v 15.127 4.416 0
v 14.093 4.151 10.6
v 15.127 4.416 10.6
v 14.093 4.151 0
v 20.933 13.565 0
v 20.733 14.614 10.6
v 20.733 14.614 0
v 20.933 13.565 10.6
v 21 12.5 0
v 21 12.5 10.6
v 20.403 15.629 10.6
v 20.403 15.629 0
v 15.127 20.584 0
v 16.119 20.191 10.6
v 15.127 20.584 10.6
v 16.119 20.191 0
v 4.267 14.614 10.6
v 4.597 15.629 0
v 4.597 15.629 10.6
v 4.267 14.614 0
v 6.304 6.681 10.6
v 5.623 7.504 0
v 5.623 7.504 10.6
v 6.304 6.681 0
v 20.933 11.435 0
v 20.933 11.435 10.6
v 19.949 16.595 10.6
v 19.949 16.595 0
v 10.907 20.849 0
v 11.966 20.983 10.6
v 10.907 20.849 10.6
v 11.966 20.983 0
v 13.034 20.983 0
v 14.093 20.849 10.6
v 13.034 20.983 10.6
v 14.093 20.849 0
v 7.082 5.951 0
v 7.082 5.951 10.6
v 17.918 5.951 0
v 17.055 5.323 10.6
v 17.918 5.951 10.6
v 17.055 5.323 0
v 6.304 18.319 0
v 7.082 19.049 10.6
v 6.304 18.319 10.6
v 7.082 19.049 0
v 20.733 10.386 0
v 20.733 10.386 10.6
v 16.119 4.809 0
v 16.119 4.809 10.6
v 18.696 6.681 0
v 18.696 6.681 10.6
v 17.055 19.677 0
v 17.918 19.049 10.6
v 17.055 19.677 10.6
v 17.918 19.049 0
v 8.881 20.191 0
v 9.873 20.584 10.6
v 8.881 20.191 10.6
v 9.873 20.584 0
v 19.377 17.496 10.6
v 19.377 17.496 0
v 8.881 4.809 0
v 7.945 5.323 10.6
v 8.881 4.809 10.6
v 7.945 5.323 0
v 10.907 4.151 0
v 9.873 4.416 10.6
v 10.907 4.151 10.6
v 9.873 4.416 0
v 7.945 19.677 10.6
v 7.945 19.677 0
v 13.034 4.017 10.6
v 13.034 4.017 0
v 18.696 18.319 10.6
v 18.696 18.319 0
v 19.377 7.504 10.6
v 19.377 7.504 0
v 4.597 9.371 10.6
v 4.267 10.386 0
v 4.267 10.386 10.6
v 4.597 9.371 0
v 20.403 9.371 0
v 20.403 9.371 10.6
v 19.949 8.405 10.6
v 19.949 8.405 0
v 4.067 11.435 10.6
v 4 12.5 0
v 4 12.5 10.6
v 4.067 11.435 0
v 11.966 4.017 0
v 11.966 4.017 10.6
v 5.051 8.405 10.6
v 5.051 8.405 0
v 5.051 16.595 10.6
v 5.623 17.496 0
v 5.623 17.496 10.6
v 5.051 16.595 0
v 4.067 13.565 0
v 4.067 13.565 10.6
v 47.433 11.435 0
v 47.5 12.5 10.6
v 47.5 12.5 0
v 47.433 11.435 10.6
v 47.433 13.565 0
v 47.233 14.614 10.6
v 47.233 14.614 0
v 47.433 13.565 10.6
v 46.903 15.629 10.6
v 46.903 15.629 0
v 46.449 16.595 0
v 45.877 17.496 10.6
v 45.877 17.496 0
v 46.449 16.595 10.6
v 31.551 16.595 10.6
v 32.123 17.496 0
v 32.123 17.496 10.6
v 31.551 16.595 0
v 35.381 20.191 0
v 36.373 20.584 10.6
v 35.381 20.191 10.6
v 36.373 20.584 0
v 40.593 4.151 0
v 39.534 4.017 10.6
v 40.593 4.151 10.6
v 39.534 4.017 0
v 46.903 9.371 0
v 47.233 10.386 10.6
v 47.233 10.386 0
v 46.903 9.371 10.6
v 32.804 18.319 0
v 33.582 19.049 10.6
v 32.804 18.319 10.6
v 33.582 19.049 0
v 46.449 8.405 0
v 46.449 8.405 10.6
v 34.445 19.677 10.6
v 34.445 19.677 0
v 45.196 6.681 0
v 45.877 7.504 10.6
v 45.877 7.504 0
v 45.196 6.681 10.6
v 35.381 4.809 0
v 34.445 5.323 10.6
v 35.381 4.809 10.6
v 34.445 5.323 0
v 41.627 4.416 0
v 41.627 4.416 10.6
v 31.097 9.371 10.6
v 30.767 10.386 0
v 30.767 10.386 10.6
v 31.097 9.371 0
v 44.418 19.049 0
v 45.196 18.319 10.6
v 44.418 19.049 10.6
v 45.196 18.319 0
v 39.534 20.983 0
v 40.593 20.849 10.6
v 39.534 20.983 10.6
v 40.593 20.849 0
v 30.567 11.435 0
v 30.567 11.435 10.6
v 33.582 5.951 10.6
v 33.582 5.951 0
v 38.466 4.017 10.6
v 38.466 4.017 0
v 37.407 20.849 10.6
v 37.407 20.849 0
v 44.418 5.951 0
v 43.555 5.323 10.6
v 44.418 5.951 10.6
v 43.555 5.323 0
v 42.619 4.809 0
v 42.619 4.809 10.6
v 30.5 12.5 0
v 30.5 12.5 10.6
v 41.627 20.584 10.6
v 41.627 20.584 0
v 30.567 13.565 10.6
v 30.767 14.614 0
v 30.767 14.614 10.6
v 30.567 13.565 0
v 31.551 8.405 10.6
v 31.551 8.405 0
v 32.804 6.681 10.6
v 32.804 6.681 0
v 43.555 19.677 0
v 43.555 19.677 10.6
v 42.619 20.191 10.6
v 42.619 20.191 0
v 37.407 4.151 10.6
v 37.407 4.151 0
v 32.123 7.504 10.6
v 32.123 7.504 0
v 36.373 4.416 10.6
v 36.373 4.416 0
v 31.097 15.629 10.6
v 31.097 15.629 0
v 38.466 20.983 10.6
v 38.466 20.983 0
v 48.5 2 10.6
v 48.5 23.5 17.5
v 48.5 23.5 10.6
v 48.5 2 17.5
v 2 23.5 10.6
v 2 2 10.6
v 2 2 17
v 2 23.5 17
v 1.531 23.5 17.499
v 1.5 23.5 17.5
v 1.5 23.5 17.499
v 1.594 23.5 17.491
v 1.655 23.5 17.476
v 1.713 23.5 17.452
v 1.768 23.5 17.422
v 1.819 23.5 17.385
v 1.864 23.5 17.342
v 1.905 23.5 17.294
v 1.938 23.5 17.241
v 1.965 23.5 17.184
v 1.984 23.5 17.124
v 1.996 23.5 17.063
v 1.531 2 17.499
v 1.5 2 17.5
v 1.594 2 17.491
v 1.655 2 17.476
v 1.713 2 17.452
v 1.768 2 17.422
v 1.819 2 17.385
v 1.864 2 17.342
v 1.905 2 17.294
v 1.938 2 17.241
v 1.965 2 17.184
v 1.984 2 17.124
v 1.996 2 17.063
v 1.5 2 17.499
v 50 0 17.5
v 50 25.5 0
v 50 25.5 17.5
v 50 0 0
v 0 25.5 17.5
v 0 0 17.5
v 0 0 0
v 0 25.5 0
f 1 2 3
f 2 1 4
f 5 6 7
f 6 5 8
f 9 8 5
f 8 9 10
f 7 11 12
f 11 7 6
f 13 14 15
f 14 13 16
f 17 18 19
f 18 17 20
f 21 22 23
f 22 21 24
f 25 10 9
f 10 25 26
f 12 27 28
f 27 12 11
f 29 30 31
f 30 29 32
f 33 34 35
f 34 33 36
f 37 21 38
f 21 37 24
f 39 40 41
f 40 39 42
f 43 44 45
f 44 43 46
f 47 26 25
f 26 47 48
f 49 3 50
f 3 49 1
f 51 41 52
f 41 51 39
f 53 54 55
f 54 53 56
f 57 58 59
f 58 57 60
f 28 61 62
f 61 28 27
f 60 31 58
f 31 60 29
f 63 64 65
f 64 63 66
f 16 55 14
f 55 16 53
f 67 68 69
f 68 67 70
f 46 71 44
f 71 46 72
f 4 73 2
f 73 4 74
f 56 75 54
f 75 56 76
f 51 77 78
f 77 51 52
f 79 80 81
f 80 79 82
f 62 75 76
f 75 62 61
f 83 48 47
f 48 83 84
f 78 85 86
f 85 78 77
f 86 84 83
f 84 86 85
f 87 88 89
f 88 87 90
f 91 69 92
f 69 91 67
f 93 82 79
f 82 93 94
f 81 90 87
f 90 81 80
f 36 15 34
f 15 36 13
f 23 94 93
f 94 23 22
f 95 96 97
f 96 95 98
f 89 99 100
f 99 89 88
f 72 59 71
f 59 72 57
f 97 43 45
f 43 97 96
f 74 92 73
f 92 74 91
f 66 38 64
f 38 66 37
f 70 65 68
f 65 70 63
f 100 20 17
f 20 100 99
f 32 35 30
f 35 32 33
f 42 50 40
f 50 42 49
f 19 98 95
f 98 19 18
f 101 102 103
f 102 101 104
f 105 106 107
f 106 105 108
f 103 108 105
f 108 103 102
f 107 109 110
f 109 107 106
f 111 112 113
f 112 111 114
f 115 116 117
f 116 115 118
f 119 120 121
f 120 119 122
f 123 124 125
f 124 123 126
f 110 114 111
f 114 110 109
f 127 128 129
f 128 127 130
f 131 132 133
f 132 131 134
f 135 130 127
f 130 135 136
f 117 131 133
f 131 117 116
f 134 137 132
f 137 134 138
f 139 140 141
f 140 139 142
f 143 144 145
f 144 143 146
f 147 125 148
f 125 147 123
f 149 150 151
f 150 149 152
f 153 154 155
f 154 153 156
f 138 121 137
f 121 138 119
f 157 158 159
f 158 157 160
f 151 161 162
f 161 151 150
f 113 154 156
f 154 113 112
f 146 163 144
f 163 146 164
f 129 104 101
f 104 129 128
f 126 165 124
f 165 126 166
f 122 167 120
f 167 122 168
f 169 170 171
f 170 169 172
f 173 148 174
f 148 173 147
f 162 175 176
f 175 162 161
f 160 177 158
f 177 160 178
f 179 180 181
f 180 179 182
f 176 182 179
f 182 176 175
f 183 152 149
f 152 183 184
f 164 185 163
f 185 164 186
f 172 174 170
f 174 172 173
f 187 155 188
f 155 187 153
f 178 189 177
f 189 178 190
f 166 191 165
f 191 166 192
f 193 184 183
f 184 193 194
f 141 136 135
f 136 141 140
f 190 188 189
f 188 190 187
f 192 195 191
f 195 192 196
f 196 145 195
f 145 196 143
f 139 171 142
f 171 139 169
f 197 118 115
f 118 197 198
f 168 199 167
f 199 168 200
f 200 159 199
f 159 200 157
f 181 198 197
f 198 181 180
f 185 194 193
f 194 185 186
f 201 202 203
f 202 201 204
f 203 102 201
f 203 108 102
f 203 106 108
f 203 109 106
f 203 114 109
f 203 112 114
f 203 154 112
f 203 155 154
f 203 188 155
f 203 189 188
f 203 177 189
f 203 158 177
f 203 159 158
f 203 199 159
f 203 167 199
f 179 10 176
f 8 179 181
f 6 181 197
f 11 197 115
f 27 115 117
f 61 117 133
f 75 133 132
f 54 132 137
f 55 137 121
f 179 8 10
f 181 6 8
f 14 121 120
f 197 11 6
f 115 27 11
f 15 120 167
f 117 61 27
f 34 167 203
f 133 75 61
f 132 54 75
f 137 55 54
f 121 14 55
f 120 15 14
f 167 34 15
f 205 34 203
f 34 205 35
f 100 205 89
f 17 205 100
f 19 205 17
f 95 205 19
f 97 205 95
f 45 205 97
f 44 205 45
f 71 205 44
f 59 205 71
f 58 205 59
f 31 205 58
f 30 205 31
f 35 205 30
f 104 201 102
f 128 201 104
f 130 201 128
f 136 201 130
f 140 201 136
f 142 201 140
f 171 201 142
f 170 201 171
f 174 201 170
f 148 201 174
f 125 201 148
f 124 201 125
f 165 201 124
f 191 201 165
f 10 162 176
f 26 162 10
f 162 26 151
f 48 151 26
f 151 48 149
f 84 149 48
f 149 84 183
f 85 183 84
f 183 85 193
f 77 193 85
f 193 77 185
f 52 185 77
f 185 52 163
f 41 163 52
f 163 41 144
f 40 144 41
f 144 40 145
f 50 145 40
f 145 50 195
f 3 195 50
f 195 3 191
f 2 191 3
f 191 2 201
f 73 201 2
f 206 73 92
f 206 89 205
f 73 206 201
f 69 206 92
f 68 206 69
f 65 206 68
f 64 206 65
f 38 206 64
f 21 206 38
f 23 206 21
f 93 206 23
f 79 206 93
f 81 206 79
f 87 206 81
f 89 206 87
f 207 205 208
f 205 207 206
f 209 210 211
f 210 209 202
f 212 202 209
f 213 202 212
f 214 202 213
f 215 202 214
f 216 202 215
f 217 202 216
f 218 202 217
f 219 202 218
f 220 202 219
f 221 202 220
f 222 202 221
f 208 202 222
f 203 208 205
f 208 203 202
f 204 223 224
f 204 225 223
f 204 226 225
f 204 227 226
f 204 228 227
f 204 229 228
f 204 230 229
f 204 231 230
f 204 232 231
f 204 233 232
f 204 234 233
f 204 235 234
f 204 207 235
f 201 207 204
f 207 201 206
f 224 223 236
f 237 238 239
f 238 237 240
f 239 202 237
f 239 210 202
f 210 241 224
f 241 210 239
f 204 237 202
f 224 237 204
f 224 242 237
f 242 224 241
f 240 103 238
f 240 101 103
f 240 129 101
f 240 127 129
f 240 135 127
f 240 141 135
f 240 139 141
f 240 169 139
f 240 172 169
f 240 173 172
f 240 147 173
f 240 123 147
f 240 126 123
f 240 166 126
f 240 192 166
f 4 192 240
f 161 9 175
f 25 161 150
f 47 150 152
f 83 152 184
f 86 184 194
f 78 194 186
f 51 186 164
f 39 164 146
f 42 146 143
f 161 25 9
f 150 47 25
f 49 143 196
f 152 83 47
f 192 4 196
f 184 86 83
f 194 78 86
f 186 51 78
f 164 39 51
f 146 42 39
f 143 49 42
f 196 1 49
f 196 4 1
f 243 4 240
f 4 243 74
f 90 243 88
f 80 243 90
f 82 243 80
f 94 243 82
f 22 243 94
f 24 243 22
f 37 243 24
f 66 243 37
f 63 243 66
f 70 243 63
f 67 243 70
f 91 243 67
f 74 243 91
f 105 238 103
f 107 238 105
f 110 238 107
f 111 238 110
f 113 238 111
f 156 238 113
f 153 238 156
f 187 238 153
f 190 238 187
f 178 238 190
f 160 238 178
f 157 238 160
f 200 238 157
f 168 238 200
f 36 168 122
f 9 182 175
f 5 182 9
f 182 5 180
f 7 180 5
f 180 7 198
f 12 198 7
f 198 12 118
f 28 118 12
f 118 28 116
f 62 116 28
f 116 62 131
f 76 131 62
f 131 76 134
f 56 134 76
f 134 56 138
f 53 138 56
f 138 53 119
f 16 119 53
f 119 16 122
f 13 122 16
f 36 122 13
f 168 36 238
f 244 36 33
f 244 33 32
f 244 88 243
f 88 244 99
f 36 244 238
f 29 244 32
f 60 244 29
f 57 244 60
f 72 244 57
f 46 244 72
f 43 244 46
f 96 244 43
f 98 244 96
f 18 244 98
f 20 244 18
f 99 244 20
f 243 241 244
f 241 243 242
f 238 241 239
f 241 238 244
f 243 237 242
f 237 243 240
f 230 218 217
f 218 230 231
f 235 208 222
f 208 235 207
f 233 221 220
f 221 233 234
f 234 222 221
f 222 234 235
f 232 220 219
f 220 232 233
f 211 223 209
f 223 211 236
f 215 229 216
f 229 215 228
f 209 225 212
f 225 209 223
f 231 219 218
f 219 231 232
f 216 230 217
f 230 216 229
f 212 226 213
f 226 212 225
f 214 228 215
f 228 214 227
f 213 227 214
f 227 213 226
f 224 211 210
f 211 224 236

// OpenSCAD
//$fn=50;
//minkowski();
module ultrasonic_carrier(){
    difference(){
        difference(){
            //Ultrasonic Carrier
            cube([50, 25.5, 17.5]);
            translate([0, 0, 4.1]){
                //ultrasonic sensor
                union(){
                    translate([12.5, 12.5, 0]){
                        cylinder(15, 8.5, 8.5, true);
                        //24.5
                        translate([26.5, 0, 0]){
                            cylinder(15, 8.5, 8.5, true);
                        }
                    }

                    translate([2, 2, 6.5]){
                        cube([46.5, 21.5, 7]);
                    }
                }
            }
        }
        //Rim for better insertion
        translate([1.5, 12.75, 17]){
            rotate([90, 180, 0]){
                difference(){
                    difference(){
                        cylinder(21.5, 2, 2, true);
                        cylinder(22, 0.5, 0.5, true);
                    }
                    union(){
                        translate([-10, 0, -12.5]){
                            cube([20, 5, 25]);
                        }
                        translate([0, -10, -12.5]){
                            cube([5, 20, 25]);
                        }
                    }
                }
            }
        }
    }
}

$fn=50;

//intersection(){
ultrasonic_carrier();
/*
    translate([0, 0, 9.5]){
        cube([50, 25.5, 3]);
    }
}
*/
